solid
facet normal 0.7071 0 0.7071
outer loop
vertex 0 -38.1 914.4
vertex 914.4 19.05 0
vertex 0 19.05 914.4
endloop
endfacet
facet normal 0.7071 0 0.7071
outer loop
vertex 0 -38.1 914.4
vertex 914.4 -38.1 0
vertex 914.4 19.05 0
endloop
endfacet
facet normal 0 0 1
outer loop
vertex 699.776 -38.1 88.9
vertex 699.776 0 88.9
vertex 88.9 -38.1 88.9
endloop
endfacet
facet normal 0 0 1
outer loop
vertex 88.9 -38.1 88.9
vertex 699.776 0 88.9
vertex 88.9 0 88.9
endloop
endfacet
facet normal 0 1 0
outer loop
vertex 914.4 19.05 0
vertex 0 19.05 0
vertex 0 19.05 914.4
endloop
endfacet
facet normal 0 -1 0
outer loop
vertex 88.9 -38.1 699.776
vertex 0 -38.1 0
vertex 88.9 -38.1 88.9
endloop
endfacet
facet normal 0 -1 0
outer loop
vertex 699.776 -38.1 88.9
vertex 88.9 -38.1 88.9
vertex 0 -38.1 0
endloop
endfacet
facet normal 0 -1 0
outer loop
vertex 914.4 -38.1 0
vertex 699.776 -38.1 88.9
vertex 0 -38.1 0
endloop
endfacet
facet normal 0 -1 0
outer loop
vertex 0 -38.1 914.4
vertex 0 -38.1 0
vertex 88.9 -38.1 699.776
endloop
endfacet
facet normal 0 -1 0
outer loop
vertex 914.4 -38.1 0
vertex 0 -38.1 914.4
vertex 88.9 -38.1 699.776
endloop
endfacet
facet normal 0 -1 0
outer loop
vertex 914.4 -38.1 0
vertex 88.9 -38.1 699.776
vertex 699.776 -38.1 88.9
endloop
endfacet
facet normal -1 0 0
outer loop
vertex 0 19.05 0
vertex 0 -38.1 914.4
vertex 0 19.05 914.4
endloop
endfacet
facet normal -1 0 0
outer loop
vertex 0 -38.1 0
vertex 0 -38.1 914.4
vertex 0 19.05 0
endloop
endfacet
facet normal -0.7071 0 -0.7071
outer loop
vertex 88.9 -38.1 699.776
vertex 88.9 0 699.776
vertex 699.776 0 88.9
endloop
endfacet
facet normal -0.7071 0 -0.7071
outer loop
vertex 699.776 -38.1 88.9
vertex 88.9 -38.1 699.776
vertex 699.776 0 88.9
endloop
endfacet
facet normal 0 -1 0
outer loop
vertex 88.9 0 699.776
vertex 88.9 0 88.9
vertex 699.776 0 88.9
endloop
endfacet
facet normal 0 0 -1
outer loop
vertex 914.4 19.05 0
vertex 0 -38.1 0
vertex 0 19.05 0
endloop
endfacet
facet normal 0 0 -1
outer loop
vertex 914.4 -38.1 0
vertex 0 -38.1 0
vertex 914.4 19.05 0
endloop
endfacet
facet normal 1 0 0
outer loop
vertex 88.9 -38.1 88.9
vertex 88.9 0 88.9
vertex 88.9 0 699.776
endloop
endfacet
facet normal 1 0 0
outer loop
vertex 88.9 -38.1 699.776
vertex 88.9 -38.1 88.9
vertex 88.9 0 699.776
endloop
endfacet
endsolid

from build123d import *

# Parameters (mm, degrees)
F0_R     = 9.525
F1_DEPTH = 38.1
F2_DEPTH = 19.05


with BuildPart() as f1:
    # F0 (on Front) → F1 (new body)
    with BuildSketch(Plane.XZ):
        Polygon((914.4, 0), (0, 914.4), (0, 0), align=None)
        with Locations((44.45, 44.45)):
            Circle(F0_R, mode=Mode.SUBTRACT)
        Polygon((699.776414305, 88.9), (88.9, 88.9), (88.9, 699.776414305), align=None, mode=Mode.SUBTRACT)
        with Locations((44.45, 44.45)):
            Circle(F0_R)
    extrude(amount=F1_DEPTH)

    # F0 (on Front) → F2 (join)
    with BuildSketch(Plane.XZ):
        Polygon((914.4, 0), (0, 914.4), (0, 0), align=None)
        with Locations((44.45, 44.45)):
            Circle(F0_R, mode=Mode.SUBTRACT)
        Polygon((699.776414305, 88.9), (88.9, 88.9), (88.9, 699.776414305), align=None, mode=Mode.SUBTRACT)
        Polygon((88.9, 699.776414305), (88.9, 88.9), (699.776414305, 88.9), align=None)
        with Locations((44.45, 44.45)):
            Circle(F0_R)
    extrude(amount=-F2_DEPTH)


solid = f1.part
